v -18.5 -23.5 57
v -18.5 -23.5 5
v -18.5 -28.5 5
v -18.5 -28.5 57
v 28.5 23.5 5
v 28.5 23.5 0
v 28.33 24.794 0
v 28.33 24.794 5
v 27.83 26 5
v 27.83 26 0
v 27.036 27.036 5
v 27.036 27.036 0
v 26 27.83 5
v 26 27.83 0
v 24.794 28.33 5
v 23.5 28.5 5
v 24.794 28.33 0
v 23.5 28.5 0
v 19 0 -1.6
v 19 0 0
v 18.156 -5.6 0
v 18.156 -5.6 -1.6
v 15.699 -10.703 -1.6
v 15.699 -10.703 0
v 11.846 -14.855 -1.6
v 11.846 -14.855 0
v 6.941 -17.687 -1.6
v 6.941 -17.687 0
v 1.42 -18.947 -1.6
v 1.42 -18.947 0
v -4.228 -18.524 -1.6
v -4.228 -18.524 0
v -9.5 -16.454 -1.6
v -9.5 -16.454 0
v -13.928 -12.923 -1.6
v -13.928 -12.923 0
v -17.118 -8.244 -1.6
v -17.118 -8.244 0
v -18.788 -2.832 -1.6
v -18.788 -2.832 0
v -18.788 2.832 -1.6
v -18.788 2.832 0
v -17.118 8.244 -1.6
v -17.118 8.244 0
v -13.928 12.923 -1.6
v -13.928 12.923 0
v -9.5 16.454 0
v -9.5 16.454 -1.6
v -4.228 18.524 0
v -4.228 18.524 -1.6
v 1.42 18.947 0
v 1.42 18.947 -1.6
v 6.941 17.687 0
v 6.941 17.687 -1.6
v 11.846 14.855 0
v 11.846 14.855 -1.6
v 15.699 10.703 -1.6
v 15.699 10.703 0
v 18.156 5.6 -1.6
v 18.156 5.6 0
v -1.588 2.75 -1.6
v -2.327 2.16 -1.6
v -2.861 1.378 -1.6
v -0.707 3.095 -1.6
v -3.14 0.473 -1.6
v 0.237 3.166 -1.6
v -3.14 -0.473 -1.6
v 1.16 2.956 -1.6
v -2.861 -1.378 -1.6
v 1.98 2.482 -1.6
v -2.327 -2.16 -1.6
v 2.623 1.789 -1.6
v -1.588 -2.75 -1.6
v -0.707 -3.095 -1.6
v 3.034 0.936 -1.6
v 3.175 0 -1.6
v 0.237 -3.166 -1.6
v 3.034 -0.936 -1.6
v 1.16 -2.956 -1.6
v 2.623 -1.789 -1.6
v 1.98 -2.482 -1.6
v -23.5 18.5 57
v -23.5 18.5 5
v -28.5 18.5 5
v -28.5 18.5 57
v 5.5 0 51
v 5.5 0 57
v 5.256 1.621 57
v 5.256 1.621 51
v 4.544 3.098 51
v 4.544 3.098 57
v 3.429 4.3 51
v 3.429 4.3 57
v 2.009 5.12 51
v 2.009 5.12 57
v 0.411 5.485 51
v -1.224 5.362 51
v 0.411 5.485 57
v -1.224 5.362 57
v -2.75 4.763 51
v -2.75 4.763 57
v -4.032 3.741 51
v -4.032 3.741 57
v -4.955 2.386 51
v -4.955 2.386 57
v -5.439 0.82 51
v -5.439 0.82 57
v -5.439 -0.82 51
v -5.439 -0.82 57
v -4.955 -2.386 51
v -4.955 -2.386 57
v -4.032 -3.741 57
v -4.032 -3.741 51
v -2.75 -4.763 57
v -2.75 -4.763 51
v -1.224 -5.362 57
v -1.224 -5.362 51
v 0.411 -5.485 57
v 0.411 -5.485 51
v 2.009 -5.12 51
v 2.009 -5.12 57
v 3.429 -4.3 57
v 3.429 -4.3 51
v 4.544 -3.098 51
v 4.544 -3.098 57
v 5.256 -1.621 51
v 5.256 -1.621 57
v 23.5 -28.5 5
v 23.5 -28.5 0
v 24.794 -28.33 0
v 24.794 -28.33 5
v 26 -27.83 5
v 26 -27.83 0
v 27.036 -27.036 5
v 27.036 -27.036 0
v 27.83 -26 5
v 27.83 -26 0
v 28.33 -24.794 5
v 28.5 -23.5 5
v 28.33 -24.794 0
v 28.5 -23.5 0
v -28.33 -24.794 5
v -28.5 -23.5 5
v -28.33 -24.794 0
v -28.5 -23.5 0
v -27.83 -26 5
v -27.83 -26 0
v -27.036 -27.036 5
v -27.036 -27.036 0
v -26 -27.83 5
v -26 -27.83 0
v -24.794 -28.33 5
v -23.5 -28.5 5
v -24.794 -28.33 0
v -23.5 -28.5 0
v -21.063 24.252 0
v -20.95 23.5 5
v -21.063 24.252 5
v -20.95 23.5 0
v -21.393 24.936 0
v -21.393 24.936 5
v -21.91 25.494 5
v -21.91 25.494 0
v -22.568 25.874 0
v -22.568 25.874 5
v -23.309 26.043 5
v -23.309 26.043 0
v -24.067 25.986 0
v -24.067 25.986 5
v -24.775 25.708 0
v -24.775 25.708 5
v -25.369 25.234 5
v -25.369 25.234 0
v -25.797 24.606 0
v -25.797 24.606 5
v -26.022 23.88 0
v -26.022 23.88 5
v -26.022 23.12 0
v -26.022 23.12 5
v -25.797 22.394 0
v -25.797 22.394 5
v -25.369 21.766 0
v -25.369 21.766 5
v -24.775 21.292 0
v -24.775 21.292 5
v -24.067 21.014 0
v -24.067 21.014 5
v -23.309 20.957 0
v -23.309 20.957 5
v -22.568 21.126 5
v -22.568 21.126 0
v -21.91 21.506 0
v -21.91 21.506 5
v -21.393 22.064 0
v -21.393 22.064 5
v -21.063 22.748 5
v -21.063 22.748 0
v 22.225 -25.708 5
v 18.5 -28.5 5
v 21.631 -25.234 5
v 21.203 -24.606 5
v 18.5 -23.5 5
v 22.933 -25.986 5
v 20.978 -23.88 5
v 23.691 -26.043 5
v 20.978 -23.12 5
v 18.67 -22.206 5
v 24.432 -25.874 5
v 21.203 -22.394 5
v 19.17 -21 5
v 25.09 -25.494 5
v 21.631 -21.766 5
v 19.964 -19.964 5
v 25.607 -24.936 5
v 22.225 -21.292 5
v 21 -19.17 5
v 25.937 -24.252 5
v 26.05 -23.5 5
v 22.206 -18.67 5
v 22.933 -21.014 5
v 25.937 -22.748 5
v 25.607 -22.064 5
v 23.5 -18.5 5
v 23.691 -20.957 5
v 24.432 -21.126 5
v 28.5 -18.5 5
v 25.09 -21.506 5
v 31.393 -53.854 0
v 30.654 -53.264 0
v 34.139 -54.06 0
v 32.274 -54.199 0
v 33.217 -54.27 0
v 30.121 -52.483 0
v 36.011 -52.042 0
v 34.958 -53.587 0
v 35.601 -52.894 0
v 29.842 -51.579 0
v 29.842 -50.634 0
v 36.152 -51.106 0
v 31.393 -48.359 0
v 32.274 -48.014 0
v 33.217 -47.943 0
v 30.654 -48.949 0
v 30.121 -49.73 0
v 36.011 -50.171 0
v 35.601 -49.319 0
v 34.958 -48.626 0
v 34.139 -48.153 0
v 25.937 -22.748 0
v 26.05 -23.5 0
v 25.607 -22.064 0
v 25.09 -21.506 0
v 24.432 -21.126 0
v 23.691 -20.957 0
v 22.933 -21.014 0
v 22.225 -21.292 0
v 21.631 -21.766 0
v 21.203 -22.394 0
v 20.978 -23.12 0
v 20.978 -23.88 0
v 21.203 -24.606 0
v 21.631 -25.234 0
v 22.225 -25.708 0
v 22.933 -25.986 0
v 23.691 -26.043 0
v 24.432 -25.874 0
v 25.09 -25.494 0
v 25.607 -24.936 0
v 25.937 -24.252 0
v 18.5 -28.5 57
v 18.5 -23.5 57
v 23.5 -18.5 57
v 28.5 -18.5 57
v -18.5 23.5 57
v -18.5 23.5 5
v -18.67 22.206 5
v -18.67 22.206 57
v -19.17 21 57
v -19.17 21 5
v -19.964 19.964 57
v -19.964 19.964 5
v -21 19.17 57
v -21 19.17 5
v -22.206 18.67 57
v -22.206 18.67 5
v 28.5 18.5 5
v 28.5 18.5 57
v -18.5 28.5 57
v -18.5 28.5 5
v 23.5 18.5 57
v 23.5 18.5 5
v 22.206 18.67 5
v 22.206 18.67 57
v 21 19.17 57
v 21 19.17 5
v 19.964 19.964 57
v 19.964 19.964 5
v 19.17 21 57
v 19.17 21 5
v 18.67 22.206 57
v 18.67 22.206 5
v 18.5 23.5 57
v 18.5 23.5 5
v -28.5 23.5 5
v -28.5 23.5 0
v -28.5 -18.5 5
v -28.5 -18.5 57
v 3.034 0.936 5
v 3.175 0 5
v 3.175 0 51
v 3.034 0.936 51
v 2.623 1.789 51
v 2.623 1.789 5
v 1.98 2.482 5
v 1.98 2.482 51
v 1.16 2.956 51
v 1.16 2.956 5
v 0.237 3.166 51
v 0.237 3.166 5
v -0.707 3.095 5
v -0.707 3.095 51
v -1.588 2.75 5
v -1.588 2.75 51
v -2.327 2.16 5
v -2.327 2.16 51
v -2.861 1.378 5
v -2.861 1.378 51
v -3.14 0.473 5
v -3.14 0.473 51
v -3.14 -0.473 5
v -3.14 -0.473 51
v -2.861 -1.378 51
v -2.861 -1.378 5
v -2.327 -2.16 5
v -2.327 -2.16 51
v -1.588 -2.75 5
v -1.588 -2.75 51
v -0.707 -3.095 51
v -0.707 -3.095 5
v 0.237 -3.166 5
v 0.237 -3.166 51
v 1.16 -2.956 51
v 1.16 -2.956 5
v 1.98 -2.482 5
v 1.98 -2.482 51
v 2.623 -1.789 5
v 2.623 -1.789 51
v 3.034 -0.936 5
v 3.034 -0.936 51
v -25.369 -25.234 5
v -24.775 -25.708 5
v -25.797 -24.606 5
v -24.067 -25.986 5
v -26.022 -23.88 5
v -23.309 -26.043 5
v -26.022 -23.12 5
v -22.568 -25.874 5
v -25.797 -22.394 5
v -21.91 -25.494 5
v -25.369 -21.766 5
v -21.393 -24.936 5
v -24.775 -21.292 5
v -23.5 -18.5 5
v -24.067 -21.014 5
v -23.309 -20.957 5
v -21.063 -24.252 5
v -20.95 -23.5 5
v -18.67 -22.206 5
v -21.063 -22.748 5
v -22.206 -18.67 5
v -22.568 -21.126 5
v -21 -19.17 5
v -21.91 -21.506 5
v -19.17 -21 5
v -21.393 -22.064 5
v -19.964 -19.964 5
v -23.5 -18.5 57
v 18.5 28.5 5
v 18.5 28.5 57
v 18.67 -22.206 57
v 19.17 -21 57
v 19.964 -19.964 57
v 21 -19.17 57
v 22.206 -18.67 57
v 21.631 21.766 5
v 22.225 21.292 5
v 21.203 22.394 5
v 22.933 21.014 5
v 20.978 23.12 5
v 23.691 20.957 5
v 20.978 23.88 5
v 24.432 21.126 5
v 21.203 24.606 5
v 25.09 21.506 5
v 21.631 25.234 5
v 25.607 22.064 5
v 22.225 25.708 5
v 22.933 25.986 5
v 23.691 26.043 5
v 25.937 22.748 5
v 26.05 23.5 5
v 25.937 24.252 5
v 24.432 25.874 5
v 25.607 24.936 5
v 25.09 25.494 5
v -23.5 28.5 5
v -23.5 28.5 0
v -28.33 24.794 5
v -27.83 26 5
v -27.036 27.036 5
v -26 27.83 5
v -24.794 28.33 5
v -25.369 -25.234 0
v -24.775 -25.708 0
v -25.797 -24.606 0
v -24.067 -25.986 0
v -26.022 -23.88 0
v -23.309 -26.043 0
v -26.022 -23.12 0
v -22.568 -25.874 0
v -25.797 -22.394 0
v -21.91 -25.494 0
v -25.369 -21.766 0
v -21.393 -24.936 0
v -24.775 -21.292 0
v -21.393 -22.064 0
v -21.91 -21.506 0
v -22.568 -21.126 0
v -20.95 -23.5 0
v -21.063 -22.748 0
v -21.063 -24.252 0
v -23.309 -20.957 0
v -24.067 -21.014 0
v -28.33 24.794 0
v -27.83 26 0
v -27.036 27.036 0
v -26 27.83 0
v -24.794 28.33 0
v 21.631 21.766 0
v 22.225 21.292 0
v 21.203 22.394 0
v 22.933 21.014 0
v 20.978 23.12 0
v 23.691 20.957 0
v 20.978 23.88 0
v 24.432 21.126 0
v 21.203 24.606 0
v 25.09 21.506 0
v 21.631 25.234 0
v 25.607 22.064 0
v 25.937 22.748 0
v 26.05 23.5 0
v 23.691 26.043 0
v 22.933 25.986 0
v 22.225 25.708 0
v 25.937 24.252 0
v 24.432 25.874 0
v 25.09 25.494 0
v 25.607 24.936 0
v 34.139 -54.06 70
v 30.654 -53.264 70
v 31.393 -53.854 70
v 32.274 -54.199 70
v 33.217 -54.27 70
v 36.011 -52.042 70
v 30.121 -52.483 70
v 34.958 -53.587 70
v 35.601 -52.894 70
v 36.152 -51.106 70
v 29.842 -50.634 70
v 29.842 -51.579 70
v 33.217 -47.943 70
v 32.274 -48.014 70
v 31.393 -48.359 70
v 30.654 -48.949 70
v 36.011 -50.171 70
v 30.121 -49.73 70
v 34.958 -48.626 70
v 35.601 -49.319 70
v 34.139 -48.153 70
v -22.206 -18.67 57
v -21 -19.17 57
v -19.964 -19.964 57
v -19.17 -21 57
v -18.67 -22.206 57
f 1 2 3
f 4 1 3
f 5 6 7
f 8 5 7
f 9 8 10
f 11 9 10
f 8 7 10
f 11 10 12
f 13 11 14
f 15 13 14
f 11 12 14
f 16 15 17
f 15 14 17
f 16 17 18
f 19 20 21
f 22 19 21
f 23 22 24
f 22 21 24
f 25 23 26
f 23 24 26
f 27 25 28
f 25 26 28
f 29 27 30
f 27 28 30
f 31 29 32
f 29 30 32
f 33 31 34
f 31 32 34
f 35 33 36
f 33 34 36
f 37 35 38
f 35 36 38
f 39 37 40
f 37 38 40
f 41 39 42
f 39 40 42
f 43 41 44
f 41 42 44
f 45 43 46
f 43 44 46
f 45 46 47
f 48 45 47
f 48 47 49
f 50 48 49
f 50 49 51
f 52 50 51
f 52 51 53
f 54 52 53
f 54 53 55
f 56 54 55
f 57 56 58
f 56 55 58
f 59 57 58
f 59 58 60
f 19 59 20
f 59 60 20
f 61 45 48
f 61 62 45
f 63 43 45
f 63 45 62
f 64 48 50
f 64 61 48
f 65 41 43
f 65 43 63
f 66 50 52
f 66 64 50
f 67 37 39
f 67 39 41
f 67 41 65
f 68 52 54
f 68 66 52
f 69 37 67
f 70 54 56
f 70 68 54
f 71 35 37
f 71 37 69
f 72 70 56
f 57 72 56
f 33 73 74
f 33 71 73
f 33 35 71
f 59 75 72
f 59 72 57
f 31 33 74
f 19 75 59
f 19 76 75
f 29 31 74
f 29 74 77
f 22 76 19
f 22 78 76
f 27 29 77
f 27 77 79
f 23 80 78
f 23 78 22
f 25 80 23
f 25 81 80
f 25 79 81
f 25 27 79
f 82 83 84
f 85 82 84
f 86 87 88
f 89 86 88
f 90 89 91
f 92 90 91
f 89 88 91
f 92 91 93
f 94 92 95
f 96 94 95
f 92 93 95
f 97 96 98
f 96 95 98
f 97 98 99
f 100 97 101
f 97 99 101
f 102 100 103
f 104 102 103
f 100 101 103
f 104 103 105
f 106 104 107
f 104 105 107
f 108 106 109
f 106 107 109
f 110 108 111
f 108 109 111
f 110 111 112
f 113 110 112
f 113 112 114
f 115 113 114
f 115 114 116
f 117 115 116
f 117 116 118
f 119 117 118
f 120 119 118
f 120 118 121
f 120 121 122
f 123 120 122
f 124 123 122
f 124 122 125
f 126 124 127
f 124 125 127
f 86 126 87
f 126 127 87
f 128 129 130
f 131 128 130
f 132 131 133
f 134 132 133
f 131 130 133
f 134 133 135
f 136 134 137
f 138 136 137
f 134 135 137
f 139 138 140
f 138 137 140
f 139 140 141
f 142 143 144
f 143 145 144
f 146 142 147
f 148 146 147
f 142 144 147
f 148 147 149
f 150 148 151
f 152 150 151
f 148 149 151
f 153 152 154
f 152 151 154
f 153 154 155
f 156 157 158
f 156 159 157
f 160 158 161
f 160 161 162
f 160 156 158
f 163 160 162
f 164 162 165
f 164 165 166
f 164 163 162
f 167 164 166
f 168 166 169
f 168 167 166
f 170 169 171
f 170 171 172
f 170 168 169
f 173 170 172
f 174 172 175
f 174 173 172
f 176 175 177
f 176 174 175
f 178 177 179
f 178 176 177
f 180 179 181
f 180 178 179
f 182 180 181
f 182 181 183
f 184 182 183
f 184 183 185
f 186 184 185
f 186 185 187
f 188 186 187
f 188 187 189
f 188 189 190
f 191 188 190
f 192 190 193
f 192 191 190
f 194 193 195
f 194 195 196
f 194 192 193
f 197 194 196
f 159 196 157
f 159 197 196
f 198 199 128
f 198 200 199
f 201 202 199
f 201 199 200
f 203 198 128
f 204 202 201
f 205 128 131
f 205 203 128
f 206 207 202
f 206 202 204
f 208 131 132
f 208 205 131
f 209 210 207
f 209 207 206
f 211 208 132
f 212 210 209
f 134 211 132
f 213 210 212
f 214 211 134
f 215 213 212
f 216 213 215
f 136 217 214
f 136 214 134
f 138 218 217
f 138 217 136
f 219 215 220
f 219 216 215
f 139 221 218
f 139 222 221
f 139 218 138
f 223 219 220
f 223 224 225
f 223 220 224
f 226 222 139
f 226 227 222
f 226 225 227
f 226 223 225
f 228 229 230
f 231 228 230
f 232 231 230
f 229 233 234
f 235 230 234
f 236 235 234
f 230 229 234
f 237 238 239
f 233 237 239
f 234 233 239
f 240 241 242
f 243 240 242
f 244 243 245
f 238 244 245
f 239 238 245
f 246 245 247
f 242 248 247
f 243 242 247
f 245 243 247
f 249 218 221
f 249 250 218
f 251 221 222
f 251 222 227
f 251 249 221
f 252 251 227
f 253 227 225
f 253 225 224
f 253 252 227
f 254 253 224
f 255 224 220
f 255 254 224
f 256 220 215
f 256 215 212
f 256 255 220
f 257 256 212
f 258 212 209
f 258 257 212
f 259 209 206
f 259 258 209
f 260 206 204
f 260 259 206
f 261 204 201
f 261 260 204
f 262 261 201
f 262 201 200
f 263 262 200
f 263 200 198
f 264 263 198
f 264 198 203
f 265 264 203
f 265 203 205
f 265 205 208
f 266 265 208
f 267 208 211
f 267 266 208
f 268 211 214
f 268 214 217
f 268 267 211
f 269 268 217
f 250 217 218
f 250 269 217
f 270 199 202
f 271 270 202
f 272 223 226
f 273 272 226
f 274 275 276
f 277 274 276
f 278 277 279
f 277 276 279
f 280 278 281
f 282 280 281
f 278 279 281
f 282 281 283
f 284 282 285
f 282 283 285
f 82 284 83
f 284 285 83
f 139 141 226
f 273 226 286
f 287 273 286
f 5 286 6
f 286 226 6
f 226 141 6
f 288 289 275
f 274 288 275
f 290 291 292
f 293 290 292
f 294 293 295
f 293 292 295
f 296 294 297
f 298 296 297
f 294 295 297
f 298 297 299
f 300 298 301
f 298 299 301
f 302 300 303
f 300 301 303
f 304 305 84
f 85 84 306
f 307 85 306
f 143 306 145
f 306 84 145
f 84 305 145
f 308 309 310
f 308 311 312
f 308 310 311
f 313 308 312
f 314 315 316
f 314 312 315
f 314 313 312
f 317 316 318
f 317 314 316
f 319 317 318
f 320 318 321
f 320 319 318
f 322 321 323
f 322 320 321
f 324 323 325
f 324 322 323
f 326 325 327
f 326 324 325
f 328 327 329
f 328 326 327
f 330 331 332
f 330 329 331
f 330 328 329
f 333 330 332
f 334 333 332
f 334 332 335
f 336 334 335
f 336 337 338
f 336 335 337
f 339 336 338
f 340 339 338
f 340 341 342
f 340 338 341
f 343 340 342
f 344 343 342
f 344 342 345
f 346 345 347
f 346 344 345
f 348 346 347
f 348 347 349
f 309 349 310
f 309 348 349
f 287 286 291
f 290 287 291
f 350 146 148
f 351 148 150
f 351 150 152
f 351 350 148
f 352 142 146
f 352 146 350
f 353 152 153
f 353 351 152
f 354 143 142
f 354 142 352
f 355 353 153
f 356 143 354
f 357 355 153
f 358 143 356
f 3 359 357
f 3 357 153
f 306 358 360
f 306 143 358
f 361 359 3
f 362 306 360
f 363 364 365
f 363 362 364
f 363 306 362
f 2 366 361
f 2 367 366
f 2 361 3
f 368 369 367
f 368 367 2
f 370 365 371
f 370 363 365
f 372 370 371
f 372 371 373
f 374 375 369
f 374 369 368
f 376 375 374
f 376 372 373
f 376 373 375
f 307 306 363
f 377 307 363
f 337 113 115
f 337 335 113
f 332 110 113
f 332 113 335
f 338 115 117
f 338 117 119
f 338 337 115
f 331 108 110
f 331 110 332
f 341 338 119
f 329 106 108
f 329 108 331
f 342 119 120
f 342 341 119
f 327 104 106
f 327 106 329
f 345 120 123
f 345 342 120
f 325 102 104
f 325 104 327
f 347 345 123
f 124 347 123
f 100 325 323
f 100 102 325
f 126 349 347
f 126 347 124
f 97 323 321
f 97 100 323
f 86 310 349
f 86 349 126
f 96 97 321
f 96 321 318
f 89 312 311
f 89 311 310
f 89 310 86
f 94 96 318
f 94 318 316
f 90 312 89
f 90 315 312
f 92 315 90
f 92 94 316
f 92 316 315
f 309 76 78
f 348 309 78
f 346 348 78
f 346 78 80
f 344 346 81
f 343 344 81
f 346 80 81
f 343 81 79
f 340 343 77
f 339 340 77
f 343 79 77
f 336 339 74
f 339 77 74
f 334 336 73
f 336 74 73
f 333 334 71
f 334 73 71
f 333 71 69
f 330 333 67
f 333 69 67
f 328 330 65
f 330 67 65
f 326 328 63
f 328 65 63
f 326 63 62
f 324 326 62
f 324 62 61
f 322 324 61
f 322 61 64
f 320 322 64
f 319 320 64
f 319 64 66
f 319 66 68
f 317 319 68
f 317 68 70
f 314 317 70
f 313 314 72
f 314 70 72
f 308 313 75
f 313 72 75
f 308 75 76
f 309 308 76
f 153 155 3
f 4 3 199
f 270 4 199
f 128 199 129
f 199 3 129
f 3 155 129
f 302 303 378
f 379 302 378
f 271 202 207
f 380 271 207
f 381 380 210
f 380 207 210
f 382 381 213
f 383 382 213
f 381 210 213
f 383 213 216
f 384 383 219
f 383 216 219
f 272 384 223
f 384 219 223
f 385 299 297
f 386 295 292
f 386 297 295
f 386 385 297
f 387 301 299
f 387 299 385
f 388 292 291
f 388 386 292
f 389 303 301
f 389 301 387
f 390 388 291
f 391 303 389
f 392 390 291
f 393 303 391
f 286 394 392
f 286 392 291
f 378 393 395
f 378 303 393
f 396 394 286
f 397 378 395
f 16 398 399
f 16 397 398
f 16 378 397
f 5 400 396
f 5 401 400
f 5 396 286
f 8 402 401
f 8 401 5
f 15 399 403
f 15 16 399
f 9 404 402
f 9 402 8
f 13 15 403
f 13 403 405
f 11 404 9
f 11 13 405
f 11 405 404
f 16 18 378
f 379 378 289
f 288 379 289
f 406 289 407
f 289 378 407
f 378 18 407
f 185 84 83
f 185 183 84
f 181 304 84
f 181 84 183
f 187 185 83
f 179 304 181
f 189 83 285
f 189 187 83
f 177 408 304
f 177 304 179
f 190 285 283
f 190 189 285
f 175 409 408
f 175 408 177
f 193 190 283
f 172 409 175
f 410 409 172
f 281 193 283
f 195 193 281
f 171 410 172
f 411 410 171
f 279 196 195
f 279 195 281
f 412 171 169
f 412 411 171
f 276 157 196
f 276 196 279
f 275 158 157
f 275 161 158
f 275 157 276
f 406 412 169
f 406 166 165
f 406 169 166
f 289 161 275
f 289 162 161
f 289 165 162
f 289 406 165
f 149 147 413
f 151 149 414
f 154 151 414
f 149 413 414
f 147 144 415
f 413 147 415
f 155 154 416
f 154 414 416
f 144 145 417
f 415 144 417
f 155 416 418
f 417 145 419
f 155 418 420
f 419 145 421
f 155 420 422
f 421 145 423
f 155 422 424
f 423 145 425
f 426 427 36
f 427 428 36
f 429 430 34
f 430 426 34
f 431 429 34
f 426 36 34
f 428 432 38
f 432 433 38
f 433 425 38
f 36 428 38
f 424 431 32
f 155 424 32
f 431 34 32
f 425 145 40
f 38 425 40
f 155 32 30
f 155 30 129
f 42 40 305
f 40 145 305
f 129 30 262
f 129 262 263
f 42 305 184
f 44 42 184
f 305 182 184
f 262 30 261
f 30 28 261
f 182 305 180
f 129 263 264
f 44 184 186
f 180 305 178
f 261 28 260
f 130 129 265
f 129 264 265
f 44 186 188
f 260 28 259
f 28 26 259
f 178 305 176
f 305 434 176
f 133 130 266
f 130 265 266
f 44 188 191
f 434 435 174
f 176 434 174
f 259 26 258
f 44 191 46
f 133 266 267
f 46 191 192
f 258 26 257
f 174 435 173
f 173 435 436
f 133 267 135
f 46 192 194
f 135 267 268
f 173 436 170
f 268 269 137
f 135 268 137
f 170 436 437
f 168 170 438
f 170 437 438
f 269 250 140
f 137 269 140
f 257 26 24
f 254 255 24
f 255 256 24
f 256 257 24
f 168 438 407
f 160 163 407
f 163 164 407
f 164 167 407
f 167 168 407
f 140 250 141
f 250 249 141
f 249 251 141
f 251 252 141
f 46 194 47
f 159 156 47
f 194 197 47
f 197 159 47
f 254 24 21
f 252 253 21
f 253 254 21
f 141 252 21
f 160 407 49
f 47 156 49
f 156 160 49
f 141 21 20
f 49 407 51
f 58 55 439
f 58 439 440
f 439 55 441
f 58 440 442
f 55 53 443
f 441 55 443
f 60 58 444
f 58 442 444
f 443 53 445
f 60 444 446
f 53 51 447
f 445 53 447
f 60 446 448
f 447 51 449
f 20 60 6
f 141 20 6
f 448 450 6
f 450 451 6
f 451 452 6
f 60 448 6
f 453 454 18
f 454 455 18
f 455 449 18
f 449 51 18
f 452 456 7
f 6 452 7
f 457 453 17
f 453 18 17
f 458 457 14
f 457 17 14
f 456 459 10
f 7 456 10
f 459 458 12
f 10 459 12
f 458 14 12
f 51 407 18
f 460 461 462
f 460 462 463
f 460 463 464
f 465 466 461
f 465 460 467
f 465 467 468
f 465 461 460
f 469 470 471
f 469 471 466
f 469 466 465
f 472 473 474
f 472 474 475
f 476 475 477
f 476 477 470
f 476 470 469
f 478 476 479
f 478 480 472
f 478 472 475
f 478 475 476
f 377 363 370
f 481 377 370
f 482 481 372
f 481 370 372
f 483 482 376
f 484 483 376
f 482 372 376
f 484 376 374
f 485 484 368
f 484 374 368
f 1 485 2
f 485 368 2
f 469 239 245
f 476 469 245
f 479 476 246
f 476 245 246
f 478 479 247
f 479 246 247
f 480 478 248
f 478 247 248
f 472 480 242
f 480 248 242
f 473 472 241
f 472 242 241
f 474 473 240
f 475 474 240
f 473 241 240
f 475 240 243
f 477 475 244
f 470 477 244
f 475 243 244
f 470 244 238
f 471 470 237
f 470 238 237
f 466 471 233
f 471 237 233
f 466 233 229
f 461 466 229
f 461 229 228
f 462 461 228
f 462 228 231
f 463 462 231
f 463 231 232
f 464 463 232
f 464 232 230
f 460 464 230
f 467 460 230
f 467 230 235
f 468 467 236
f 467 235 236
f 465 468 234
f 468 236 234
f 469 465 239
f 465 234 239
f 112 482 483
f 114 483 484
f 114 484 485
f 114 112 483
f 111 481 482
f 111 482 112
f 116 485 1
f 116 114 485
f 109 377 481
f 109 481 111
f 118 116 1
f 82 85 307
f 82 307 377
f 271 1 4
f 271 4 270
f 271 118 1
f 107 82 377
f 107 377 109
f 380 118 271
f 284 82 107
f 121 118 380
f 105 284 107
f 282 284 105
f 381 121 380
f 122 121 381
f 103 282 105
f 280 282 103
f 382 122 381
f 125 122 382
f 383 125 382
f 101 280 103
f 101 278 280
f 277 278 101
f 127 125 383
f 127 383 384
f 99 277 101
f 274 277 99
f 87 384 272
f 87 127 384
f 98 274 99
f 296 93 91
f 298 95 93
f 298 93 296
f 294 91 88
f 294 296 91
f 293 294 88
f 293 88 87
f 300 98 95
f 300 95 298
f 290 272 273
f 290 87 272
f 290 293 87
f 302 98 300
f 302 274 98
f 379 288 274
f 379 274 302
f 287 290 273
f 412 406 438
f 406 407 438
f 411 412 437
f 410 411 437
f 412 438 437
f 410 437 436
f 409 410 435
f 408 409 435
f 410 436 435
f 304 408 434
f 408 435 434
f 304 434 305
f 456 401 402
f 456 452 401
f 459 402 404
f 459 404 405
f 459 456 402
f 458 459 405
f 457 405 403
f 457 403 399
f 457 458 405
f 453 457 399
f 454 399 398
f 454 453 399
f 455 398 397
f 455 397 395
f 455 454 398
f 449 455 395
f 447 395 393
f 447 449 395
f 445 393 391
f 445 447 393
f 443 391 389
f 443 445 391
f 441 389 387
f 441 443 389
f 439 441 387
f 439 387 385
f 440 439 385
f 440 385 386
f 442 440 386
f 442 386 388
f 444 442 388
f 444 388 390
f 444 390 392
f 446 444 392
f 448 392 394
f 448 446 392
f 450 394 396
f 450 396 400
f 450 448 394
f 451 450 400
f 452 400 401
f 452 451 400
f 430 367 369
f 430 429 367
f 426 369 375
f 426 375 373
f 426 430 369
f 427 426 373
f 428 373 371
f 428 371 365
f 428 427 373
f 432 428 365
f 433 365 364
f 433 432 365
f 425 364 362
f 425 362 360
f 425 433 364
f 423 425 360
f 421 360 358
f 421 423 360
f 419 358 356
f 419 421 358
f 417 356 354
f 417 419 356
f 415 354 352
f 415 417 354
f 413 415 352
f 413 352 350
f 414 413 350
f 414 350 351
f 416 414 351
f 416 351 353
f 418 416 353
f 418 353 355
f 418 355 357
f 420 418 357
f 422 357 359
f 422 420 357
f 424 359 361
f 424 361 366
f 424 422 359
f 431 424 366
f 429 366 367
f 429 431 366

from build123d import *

# Parameters (mm, degrees)
F0_R      = 2.55
F1_DEPTH  = 4
F2_R      = 19
F3_DEPTH  = 1.6
F4_R      = 3.175
F5_DEPTH  = 25
F6_DEPTH  = 1
F7_R      = 3.175
F8_DEPTH  = 52
F9_R      = 3.1725
F10_DEPTH = 70
F11_R     = 5.5
F12_DEPTH = 6


with BuildPart() as f1:
    # F0 (on Top) → F1 (new body)
    with BuildSketch(Plane.XY):
        with BuildLine():
            ThreePointArc((28.5, 23.5), (27.0355339059, 27.0355339059), (23.5, 28.5))
            Line((23.5, 28.5), (-23.5, 28.5))
            ThreePointArc((-23.5, 28.5), (-27.0355339059, 27.0355339059), (-28.5, 23.5))
            Line((-28.5, 23.5), (-28.5, -23.5))
            ThreePointArc((-28.5, -23.5), (-27.0355339059, -27.0355339059), (-23.5, -28.5))
            Line((-23.5, -28.5), (23.5, -28.5))
            ThreePointArc((23.5, -28.5), (27.0355339059, -27.0355339059), (28.5, -23.5))
            Line((28.5, -23.5), (28.5, 23.5))
        make_face()
        with Locations((-23.5, -23.5)):
            Circle(F0_R, mode=Mode.SUBTRACT)
        with Locations((23.5, -23.5)):
            Circle(F0_R, mode=Mode.SUBTRACT)
        with Locations((-23.5, 23.5)):
            Circle(F0_R, mode=Mode.SUBTRACT)
        with Locations((23.5, 23.5)):
            Circle(F0_R, mode=Mode.SUBTRACT)
    extrude(amount=F1_DEPTH)

    # F2 (on face) → F3 (join)
    with BuildSketch(Plane(origin=(0, 0, 0), x_dir=(1, 0, 0), z_dir=(0, 0, -1))):
        Circle(F2_R)
    extrude(amount=F3_DEPTH)

    # F4 (on face) → F5 (cut)
    with BuildSketch(Plane(origin=(0, 0, -1.6), x_dir=(1, 0, 0), z_dir=(0, 0, -1))):
        Circle(F4_R)
    extrude(amount=-F5_DEPTH, mode=Mode.SUBTRACT)

    # F6 (add): a face of the model
    f6_faces = [f1.faces().sort_by_distance(p)[0] for p in [
        (26.4655339059, 26.4655339059, 4),
    ]]
    extrude(f6_faces, amount=F6_DEPTH)

    # F7 (on face) → F8 (join)
    with BuildSketch(Plane.XY.offset(5)):
        with BuildLine():
            ThreePointArc((23.5, 18.5), (19.9644660941, 19.9644660941), (18.5, 23.5))
            Line((18.5, 23.5), (18.5, 28.5))
            Line((18.5, 28.5), (-18.5, 28.5))
            Line((-18.5, 28.5), (-18.5, 23.5))
            ThreePointArc((-18.5, 23.5), (-19.9644660941, 19.9644660941), (-23.5, 18.5))
            Line((-23.5, 18.5), (-28.5, 18.5))
            Line((-28.5, 18.5), (-28.5, -18.5))
            Line((-28.5, -18.5), (-23.5, -18.5))
            ThreePointArc((-23.5, -18.5), (-19.9644660941, -19.9644660941), (-18.5, -23.5))
            Line((-18.5, -23.5), (-18.5, -28.5))
            Line((-18.5, -28.5), (18.5, -28.5))
            Line((18.5, -28.5), (18.5, -23.5))
            ThreePointArc((18.5, -23.5), (19.9644660941, -19.9644660941), (23.5, -18.5))
            Line((23.5, -18.5), (28.5, -18.5))
            Line((28.5, -18.5), (28.5, 18.5))
            Line((28.5, 18.5), (23.5, 18.5))
        make_face()
        Circle(F7_R, mode=Mode.SUBTRACT)
    extrude(amount=F8_DEPTH)

    # F11 (on face) → F12 (cut)
    with BuildSketch(Plane.XY.offset(57)):
        Circle(F11_R)
    extrude(amount=-F12_DEPTH, mode=Mode.SUBTRACT)


with BuildPart() as f10:
    # F9 (on Top) → F10 (new body)
    with BuildSketch(Plane.XY):
        with Locations((32.9795107245, -51.1064752936)):
            Circle(F9_R)
    extrude(amount=F10_DEPTH)


solid = Compound([f1.part, f10.part])
